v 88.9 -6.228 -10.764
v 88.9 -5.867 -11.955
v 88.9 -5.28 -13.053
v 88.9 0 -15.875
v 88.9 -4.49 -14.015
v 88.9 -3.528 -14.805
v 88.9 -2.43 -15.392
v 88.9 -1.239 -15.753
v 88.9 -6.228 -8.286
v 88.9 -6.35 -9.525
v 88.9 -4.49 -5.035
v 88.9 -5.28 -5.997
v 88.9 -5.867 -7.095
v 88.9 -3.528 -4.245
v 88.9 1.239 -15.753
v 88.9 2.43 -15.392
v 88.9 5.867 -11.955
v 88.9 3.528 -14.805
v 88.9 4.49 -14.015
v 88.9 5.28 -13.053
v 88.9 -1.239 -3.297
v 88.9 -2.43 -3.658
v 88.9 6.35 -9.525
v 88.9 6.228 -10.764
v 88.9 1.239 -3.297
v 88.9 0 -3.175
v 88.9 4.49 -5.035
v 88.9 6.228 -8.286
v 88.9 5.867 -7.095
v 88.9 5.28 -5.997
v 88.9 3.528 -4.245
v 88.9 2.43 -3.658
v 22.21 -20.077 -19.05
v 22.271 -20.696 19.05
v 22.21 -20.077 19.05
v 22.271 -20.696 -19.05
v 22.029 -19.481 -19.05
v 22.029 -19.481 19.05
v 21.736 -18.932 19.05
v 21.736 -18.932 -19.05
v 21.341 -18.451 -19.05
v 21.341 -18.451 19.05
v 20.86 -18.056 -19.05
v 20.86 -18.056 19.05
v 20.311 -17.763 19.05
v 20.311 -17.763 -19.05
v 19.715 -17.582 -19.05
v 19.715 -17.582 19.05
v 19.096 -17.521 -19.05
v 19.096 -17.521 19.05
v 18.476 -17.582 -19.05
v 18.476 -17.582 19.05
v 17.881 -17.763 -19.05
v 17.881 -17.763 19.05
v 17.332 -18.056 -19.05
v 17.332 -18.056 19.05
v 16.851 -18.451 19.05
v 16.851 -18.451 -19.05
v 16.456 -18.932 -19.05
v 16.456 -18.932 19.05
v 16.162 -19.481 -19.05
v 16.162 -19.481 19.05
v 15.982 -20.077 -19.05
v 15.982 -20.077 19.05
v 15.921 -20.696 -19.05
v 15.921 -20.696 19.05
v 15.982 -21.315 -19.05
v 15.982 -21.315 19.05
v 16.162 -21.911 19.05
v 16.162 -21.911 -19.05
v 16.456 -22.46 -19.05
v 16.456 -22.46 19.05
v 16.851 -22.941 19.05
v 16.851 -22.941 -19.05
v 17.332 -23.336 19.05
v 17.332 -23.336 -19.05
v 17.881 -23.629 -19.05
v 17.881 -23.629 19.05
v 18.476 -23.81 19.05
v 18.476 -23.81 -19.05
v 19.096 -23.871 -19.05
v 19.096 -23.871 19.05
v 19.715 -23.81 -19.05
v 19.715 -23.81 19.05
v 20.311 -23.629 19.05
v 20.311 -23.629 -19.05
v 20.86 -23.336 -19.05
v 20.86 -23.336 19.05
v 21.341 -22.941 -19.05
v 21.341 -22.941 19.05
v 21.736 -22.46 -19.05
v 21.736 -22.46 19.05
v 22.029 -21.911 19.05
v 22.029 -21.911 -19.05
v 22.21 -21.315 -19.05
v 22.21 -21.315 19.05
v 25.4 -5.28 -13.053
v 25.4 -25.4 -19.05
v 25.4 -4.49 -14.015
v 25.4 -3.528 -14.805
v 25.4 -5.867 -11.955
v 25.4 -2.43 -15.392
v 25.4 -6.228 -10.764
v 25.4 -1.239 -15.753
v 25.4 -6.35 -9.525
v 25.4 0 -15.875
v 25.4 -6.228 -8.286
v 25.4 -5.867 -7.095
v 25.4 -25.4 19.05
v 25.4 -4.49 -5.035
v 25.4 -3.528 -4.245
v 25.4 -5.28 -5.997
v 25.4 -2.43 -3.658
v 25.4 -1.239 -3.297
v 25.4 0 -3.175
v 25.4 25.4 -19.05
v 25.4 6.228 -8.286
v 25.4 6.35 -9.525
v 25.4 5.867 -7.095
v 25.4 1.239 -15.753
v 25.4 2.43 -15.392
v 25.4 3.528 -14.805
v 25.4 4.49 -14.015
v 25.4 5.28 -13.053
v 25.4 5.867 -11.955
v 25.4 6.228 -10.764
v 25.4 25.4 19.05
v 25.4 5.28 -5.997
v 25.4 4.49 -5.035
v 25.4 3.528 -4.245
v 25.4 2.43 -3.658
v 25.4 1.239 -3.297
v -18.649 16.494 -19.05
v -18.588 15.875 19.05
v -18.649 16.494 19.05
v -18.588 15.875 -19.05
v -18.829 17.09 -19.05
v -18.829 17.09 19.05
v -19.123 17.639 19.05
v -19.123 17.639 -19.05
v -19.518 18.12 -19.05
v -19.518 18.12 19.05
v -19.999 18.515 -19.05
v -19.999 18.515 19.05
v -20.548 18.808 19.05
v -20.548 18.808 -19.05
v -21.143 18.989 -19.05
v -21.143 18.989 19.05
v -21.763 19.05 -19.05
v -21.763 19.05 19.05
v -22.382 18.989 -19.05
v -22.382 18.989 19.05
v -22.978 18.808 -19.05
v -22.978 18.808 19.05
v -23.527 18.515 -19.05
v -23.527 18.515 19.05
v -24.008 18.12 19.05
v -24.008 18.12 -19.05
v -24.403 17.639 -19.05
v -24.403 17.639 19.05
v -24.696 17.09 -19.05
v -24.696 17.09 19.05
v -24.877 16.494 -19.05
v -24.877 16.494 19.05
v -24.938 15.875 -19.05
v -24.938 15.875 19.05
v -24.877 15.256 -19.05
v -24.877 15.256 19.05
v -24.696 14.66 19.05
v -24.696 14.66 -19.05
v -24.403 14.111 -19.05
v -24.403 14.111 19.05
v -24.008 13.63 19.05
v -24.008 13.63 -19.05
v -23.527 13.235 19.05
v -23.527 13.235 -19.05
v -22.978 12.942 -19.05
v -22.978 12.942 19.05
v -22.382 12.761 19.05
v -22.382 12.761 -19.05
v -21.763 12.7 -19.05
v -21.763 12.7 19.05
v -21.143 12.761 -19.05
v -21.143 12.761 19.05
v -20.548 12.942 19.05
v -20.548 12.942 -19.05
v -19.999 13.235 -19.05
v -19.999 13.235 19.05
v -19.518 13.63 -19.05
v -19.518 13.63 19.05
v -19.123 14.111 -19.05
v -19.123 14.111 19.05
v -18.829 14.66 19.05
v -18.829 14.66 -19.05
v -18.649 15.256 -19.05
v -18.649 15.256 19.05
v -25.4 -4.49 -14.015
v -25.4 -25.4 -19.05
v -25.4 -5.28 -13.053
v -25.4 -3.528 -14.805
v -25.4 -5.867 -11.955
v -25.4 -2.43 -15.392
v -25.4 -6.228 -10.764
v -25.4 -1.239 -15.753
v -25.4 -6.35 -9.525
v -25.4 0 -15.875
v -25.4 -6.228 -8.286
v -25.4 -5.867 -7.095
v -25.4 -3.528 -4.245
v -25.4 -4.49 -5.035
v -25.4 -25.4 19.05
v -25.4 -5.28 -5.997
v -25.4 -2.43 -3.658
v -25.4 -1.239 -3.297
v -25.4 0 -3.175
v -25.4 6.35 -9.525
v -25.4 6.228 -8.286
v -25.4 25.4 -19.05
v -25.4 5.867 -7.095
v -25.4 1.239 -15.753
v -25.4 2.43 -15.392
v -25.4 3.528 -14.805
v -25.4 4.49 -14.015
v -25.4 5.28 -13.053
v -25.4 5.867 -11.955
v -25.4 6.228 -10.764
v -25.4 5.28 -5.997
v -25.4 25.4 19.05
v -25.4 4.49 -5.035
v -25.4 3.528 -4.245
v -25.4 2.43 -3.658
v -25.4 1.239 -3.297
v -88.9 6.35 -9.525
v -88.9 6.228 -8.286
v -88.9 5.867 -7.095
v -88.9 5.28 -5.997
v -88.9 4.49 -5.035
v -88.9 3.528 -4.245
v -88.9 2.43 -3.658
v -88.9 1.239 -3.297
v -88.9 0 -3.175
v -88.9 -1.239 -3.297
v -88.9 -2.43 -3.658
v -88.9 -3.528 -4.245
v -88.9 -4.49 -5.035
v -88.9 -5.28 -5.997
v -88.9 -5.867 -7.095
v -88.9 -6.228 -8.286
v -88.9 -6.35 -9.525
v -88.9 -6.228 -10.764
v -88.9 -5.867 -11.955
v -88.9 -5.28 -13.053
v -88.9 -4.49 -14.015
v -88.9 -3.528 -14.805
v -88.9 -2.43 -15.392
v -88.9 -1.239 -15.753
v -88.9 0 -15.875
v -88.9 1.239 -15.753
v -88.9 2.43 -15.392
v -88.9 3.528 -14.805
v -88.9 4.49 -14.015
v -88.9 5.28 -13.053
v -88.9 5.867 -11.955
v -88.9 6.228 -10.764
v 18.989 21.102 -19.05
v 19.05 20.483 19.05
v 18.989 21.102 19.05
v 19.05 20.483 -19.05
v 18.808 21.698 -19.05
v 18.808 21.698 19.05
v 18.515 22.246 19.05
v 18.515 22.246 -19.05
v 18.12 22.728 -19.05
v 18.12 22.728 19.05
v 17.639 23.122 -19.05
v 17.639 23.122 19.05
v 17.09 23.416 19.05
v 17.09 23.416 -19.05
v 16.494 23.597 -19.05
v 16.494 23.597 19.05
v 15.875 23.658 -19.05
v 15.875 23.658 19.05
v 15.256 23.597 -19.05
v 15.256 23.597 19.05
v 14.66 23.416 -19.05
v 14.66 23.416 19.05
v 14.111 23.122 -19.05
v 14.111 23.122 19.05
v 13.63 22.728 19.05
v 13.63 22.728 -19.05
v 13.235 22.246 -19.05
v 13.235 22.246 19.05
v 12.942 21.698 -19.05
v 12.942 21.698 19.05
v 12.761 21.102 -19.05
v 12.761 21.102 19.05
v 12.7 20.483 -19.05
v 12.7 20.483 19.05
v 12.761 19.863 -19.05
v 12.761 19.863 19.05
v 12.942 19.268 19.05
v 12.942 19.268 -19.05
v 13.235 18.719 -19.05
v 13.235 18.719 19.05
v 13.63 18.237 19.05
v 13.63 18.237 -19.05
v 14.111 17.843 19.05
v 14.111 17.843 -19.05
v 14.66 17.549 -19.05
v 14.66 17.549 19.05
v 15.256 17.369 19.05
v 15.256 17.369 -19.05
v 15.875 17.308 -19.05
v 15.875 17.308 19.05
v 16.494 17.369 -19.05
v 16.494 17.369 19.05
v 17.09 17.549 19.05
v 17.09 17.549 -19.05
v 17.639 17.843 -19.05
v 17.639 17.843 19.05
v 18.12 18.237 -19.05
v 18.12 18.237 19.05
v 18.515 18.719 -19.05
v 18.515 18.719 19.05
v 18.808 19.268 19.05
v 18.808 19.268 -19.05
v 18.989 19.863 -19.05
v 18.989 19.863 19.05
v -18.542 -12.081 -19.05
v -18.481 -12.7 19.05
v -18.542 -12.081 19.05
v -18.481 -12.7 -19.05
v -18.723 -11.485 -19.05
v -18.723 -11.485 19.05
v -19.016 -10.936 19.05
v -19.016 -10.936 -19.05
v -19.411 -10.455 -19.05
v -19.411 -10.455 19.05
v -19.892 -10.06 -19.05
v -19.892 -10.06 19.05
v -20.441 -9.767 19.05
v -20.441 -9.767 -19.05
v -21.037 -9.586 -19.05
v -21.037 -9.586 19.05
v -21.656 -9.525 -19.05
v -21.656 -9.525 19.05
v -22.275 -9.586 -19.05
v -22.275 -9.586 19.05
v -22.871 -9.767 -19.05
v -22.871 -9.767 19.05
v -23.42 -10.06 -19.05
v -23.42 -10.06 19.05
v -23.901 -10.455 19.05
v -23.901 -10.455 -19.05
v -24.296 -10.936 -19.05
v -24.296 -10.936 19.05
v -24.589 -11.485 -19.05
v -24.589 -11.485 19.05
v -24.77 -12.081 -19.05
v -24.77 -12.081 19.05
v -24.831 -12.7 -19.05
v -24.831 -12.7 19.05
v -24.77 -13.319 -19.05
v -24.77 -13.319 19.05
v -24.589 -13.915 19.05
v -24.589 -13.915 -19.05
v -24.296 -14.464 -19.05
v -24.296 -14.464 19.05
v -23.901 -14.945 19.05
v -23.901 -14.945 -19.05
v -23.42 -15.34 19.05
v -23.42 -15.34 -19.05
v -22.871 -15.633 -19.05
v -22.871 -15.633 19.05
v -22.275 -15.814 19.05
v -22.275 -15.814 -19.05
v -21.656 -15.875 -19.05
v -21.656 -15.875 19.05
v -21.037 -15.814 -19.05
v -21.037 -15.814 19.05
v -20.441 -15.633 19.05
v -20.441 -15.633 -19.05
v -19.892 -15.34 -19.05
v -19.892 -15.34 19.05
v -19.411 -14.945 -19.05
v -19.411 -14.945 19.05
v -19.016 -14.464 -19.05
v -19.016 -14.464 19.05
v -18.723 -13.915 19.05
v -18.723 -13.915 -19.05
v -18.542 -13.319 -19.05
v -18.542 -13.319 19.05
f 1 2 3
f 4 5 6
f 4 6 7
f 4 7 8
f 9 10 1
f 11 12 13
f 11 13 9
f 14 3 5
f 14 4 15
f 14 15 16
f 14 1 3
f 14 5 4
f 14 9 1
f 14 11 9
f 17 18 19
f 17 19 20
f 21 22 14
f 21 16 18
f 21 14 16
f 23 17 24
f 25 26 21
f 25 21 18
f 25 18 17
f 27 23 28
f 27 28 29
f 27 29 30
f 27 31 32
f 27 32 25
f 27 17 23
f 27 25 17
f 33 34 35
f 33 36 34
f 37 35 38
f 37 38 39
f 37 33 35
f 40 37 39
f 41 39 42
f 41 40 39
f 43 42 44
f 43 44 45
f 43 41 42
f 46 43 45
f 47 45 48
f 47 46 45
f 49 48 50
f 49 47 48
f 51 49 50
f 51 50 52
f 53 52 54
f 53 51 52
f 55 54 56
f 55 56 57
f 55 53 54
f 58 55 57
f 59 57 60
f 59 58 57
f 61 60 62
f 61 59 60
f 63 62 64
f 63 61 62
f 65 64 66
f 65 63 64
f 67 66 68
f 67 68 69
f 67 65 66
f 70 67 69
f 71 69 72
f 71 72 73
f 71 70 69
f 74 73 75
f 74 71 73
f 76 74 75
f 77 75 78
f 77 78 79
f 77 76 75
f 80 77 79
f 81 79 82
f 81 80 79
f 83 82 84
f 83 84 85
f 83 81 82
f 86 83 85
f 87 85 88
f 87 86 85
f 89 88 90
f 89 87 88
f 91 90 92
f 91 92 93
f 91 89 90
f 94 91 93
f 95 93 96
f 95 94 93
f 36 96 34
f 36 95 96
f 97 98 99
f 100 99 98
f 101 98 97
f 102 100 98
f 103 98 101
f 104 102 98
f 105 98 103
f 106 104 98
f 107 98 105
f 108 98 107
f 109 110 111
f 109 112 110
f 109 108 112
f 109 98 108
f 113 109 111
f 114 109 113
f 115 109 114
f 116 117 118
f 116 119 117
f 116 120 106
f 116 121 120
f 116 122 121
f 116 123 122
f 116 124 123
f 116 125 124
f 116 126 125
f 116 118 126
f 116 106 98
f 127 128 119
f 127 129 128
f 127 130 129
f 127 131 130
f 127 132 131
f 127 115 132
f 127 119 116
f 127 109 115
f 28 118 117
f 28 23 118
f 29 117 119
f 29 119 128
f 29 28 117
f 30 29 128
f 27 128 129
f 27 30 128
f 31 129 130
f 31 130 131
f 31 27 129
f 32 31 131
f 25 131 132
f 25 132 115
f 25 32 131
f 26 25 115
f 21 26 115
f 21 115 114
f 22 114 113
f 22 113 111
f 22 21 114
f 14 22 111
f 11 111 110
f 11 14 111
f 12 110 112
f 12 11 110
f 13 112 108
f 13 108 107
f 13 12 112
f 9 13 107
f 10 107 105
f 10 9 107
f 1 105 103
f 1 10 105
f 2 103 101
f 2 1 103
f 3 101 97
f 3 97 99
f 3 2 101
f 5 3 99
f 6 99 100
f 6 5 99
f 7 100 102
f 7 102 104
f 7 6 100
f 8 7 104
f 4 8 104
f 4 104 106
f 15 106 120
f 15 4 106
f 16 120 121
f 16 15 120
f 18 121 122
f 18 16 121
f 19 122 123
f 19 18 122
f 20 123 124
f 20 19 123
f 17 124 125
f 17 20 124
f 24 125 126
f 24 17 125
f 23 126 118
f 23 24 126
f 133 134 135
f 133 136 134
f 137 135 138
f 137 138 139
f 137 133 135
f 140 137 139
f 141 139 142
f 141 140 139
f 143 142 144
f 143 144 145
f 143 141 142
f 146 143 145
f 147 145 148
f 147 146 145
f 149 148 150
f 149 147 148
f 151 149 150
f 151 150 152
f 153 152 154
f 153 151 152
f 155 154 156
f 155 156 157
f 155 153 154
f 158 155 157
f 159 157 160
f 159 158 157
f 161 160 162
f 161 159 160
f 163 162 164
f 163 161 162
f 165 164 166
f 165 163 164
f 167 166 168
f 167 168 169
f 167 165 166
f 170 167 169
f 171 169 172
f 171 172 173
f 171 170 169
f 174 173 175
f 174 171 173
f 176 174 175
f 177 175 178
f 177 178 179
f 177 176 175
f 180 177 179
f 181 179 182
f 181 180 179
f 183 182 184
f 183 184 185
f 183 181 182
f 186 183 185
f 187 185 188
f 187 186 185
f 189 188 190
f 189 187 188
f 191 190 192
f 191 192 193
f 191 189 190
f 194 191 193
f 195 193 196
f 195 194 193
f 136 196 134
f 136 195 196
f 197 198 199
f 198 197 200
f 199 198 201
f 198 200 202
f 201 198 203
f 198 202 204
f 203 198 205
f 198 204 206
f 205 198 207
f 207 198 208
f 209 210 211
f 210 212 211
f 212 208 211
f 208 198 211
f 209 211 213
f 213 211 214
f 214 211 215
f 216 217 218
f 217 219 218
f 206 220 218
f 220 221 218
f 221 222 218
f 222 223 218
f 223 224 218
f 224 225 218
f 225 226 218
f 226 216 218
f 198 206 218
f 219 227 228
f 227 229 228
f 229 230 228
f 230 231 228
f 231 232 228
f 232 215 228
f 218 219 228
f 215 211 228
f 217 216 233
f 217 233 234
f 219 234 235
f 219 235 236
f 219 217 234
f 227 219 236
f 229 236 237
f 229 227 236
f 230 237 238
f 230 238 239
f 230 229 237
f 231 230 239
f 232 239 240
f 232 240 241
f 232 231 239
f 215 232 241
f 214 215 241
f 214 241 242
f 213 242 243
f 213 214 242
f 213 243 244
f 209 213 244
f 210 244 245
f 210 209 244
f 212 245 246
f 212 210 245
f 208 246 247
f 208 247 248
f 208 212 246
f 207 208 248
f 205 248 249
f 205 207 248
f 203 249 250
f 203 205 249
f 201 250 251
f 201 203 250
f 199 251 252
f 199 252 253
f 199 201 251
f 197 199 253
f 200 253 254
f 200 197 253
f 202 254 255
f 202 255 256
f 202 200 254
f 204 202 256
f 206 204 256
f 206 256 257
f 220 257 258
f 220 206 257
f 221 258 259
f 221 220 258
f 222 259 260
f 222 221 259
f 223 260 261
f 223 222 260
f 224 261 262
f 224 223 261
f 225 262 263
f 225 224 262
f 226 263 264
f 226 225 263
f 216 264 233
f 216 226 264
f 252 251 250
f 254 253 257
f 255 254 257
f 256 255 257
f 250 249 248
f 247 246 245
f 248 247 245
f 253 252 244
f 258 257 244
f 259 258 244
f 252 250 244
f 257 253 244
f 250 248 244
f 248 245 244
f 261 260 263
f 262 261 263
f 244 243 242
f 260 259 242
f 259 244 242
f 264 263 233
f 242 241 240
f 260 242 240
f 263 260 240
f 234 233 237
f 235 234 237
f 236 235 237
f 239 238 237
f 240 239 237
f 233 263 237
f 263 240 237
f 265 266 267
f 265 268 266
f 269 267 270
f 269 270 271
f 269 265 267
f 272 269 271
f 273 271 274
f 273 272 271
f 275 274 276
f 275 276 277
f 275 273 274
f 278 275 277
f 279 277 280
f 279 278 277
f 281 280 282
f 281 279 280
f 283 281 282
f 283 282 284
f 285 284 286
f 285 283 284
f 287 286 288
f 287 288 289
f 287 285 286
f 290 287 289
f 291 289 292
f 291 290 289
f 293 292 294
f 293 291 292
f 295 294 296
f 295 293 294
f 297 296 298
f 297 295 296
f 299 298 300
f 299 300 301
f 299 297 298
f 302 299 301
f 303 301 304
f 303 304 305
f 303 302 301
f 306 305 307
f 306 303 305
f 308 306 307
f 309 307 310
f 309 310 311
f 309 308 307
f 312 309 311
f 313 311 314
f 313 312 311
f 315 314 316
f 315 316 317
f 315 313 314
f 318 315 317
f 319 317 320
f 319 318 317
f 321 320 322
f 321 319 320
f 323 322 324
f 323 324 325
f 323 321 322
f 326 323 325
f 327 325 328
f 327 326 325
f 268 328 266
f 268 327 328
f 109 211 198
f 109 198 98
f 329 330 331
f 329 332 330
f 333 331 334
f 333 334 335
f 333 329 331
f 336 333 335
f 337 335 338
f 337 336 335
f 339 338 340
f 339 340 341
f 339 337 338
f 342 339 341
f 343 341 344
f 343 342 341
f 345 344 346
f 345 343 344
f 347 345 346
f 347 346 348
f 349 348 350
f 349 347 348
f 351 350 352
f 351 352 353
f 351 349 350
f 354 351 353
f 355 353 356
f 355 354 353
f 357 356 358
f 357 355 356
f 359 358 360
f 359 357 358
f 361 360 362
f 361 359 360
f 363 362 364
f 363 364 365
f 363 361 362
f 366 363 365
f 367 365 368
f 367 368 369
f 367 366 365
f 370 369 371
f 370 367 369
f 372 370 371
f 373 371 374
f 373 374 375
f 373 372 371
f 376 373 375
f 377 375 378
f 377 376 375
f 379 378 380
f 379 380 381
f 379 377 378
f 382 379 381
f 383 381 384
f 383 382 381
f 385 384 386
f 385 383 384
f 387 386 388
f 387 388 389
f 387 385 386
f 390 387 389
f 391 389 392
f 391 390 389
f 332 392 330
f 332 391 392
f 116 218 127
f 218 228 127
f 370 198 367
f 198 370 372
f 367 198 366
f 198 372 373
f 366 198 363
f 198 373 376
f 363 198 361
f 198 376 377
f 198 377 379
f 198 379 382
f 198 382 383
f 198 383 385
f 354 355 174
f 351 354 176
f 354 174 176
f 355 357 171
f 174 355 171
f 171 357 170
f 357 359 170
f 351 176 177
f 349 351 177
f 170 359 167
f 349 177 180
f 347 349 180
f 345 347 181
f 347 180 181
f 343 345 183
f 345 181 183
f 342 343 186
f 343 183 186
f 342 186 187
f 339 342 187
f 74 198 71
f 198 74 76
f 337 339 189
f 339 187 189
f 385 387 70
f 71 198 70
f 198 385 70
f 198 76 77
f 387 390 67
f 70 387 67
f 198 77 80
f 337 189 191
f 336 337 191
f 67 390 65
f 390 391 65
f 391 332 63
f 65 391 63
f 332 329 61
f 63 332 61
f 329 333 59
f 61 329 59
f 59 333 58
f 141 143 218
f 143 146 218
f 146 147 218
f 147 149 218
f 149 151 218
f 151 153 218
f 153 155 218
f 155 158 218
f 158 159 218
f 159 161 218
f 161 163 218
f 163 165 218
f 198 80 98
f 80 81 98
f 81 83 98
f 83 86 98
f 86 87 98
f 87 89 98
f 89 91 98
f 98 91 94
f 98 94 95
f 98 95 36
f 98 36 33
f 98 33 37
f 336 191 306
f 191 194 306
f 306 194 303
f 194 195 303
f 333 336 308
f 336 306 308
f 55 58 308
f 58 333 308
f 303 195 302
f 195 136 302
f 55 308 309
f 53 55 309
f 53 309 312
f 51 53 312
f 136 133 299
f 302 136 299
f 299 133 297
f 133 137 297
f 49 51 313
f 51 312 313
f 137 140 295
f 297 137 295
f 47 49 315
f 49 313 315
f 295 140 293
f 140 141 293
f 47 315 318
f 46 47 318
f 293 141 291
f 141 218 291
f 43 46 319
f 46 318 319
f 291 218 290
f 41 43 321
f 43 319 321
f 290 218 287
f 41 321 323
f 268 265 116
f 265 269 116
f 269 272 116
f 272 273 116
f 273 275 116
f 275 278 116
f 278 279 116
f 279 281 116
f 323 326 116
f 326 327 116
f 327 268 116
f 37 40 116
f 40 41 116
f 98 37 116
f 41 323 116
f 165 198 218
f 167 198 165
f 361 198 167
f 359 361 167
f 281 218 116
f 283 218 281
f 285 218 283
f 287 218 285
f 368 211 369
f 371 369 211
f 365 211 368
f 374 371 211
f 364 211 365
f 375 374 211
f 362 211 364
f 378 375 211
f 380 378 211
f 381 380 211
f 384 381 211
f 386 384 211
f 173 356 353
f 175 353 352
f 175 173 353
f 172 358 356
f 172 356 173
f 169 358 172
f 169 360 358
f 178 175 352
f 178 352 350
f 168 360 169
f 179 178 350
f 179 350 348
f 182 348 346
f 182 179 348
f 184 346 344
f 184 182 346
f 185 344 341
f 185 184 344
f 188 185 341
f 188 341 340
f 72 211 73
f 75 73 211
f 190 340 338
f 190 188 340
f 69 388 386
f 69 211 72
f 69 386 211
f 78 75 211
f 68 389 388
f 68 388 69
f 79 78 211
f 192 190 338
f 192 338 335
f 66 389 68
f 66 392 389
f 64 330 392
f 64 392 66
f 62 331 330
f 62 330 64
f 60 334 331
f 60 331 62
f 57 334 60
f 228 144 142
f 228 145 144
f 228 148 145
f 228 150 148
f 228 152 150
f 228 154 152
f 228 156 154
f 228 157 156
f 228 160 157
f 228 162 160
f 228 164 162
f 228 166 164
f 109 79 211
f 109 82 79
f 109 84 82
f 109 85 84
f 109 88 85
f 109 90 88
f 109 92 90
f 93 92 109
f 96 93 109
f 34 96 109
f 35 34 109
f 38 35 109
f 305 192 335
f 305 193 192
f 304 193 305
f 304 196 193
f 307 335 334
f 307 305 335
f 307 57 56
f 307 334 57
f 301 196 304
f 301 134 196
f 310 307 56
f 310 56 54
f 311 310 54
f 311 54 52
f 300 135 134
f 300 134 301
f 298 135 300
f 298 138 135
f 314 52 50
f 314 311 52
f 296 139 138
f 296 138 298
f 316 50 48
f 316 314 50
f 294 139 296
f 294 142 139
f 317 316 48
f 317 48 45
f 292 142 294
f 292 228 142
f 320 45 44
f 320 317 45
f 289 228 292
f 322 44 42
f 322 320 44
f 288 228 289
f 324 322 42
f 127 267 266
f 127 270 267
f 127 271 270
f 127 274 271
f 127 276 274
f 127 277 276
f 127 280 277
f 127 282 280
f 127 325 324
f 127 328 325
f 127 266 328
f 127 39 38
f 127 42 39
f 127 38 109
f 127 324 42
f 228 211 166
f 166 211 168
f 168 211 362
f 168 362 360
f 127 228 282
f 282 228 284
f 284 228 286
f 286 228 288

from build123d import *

# Parameters (mm, degrees)
F0_W     = 50.8
F0_H     = 50.8
F0_R     = 3.175
F1_DEPTH = 19.05
F2_R     = 6.35
F3_DEPTH = 88.9


with BuildPart() as f1:
    # F0 (on Top) → F1 (new body, symmetric)
    with BuildSketch(Plane.XY):
        Rectangle(F0_W, F0_H)
        with Locations((-21.65604, -12.7)):
            Circle(F0_R, mode=Mode.SUBTRACT)
        with Locations((19.095719, -20.695919)):
            Circle(F0_R, mode=Mode.SUBTRACT)
        with Locations((-21.762719, 15.875)):
            Circle(F0_R, mode=Mode.SUBTRACT)
        with Locations((15.875, 20.482561)):
            Circle(F0_R, mode=Mode.SUBTRACT)
    extrude(amount=F1_DEPTH, both=True)

    # F2 (on Right) → F3 (join, symmetric)
    with BuildSketch(Plane.YZ):
        with Locations((0, -9.525)):
            Circle(F2_R)
    extrude(amount=F3_DEPTH, both=True)


solid = f1.part
